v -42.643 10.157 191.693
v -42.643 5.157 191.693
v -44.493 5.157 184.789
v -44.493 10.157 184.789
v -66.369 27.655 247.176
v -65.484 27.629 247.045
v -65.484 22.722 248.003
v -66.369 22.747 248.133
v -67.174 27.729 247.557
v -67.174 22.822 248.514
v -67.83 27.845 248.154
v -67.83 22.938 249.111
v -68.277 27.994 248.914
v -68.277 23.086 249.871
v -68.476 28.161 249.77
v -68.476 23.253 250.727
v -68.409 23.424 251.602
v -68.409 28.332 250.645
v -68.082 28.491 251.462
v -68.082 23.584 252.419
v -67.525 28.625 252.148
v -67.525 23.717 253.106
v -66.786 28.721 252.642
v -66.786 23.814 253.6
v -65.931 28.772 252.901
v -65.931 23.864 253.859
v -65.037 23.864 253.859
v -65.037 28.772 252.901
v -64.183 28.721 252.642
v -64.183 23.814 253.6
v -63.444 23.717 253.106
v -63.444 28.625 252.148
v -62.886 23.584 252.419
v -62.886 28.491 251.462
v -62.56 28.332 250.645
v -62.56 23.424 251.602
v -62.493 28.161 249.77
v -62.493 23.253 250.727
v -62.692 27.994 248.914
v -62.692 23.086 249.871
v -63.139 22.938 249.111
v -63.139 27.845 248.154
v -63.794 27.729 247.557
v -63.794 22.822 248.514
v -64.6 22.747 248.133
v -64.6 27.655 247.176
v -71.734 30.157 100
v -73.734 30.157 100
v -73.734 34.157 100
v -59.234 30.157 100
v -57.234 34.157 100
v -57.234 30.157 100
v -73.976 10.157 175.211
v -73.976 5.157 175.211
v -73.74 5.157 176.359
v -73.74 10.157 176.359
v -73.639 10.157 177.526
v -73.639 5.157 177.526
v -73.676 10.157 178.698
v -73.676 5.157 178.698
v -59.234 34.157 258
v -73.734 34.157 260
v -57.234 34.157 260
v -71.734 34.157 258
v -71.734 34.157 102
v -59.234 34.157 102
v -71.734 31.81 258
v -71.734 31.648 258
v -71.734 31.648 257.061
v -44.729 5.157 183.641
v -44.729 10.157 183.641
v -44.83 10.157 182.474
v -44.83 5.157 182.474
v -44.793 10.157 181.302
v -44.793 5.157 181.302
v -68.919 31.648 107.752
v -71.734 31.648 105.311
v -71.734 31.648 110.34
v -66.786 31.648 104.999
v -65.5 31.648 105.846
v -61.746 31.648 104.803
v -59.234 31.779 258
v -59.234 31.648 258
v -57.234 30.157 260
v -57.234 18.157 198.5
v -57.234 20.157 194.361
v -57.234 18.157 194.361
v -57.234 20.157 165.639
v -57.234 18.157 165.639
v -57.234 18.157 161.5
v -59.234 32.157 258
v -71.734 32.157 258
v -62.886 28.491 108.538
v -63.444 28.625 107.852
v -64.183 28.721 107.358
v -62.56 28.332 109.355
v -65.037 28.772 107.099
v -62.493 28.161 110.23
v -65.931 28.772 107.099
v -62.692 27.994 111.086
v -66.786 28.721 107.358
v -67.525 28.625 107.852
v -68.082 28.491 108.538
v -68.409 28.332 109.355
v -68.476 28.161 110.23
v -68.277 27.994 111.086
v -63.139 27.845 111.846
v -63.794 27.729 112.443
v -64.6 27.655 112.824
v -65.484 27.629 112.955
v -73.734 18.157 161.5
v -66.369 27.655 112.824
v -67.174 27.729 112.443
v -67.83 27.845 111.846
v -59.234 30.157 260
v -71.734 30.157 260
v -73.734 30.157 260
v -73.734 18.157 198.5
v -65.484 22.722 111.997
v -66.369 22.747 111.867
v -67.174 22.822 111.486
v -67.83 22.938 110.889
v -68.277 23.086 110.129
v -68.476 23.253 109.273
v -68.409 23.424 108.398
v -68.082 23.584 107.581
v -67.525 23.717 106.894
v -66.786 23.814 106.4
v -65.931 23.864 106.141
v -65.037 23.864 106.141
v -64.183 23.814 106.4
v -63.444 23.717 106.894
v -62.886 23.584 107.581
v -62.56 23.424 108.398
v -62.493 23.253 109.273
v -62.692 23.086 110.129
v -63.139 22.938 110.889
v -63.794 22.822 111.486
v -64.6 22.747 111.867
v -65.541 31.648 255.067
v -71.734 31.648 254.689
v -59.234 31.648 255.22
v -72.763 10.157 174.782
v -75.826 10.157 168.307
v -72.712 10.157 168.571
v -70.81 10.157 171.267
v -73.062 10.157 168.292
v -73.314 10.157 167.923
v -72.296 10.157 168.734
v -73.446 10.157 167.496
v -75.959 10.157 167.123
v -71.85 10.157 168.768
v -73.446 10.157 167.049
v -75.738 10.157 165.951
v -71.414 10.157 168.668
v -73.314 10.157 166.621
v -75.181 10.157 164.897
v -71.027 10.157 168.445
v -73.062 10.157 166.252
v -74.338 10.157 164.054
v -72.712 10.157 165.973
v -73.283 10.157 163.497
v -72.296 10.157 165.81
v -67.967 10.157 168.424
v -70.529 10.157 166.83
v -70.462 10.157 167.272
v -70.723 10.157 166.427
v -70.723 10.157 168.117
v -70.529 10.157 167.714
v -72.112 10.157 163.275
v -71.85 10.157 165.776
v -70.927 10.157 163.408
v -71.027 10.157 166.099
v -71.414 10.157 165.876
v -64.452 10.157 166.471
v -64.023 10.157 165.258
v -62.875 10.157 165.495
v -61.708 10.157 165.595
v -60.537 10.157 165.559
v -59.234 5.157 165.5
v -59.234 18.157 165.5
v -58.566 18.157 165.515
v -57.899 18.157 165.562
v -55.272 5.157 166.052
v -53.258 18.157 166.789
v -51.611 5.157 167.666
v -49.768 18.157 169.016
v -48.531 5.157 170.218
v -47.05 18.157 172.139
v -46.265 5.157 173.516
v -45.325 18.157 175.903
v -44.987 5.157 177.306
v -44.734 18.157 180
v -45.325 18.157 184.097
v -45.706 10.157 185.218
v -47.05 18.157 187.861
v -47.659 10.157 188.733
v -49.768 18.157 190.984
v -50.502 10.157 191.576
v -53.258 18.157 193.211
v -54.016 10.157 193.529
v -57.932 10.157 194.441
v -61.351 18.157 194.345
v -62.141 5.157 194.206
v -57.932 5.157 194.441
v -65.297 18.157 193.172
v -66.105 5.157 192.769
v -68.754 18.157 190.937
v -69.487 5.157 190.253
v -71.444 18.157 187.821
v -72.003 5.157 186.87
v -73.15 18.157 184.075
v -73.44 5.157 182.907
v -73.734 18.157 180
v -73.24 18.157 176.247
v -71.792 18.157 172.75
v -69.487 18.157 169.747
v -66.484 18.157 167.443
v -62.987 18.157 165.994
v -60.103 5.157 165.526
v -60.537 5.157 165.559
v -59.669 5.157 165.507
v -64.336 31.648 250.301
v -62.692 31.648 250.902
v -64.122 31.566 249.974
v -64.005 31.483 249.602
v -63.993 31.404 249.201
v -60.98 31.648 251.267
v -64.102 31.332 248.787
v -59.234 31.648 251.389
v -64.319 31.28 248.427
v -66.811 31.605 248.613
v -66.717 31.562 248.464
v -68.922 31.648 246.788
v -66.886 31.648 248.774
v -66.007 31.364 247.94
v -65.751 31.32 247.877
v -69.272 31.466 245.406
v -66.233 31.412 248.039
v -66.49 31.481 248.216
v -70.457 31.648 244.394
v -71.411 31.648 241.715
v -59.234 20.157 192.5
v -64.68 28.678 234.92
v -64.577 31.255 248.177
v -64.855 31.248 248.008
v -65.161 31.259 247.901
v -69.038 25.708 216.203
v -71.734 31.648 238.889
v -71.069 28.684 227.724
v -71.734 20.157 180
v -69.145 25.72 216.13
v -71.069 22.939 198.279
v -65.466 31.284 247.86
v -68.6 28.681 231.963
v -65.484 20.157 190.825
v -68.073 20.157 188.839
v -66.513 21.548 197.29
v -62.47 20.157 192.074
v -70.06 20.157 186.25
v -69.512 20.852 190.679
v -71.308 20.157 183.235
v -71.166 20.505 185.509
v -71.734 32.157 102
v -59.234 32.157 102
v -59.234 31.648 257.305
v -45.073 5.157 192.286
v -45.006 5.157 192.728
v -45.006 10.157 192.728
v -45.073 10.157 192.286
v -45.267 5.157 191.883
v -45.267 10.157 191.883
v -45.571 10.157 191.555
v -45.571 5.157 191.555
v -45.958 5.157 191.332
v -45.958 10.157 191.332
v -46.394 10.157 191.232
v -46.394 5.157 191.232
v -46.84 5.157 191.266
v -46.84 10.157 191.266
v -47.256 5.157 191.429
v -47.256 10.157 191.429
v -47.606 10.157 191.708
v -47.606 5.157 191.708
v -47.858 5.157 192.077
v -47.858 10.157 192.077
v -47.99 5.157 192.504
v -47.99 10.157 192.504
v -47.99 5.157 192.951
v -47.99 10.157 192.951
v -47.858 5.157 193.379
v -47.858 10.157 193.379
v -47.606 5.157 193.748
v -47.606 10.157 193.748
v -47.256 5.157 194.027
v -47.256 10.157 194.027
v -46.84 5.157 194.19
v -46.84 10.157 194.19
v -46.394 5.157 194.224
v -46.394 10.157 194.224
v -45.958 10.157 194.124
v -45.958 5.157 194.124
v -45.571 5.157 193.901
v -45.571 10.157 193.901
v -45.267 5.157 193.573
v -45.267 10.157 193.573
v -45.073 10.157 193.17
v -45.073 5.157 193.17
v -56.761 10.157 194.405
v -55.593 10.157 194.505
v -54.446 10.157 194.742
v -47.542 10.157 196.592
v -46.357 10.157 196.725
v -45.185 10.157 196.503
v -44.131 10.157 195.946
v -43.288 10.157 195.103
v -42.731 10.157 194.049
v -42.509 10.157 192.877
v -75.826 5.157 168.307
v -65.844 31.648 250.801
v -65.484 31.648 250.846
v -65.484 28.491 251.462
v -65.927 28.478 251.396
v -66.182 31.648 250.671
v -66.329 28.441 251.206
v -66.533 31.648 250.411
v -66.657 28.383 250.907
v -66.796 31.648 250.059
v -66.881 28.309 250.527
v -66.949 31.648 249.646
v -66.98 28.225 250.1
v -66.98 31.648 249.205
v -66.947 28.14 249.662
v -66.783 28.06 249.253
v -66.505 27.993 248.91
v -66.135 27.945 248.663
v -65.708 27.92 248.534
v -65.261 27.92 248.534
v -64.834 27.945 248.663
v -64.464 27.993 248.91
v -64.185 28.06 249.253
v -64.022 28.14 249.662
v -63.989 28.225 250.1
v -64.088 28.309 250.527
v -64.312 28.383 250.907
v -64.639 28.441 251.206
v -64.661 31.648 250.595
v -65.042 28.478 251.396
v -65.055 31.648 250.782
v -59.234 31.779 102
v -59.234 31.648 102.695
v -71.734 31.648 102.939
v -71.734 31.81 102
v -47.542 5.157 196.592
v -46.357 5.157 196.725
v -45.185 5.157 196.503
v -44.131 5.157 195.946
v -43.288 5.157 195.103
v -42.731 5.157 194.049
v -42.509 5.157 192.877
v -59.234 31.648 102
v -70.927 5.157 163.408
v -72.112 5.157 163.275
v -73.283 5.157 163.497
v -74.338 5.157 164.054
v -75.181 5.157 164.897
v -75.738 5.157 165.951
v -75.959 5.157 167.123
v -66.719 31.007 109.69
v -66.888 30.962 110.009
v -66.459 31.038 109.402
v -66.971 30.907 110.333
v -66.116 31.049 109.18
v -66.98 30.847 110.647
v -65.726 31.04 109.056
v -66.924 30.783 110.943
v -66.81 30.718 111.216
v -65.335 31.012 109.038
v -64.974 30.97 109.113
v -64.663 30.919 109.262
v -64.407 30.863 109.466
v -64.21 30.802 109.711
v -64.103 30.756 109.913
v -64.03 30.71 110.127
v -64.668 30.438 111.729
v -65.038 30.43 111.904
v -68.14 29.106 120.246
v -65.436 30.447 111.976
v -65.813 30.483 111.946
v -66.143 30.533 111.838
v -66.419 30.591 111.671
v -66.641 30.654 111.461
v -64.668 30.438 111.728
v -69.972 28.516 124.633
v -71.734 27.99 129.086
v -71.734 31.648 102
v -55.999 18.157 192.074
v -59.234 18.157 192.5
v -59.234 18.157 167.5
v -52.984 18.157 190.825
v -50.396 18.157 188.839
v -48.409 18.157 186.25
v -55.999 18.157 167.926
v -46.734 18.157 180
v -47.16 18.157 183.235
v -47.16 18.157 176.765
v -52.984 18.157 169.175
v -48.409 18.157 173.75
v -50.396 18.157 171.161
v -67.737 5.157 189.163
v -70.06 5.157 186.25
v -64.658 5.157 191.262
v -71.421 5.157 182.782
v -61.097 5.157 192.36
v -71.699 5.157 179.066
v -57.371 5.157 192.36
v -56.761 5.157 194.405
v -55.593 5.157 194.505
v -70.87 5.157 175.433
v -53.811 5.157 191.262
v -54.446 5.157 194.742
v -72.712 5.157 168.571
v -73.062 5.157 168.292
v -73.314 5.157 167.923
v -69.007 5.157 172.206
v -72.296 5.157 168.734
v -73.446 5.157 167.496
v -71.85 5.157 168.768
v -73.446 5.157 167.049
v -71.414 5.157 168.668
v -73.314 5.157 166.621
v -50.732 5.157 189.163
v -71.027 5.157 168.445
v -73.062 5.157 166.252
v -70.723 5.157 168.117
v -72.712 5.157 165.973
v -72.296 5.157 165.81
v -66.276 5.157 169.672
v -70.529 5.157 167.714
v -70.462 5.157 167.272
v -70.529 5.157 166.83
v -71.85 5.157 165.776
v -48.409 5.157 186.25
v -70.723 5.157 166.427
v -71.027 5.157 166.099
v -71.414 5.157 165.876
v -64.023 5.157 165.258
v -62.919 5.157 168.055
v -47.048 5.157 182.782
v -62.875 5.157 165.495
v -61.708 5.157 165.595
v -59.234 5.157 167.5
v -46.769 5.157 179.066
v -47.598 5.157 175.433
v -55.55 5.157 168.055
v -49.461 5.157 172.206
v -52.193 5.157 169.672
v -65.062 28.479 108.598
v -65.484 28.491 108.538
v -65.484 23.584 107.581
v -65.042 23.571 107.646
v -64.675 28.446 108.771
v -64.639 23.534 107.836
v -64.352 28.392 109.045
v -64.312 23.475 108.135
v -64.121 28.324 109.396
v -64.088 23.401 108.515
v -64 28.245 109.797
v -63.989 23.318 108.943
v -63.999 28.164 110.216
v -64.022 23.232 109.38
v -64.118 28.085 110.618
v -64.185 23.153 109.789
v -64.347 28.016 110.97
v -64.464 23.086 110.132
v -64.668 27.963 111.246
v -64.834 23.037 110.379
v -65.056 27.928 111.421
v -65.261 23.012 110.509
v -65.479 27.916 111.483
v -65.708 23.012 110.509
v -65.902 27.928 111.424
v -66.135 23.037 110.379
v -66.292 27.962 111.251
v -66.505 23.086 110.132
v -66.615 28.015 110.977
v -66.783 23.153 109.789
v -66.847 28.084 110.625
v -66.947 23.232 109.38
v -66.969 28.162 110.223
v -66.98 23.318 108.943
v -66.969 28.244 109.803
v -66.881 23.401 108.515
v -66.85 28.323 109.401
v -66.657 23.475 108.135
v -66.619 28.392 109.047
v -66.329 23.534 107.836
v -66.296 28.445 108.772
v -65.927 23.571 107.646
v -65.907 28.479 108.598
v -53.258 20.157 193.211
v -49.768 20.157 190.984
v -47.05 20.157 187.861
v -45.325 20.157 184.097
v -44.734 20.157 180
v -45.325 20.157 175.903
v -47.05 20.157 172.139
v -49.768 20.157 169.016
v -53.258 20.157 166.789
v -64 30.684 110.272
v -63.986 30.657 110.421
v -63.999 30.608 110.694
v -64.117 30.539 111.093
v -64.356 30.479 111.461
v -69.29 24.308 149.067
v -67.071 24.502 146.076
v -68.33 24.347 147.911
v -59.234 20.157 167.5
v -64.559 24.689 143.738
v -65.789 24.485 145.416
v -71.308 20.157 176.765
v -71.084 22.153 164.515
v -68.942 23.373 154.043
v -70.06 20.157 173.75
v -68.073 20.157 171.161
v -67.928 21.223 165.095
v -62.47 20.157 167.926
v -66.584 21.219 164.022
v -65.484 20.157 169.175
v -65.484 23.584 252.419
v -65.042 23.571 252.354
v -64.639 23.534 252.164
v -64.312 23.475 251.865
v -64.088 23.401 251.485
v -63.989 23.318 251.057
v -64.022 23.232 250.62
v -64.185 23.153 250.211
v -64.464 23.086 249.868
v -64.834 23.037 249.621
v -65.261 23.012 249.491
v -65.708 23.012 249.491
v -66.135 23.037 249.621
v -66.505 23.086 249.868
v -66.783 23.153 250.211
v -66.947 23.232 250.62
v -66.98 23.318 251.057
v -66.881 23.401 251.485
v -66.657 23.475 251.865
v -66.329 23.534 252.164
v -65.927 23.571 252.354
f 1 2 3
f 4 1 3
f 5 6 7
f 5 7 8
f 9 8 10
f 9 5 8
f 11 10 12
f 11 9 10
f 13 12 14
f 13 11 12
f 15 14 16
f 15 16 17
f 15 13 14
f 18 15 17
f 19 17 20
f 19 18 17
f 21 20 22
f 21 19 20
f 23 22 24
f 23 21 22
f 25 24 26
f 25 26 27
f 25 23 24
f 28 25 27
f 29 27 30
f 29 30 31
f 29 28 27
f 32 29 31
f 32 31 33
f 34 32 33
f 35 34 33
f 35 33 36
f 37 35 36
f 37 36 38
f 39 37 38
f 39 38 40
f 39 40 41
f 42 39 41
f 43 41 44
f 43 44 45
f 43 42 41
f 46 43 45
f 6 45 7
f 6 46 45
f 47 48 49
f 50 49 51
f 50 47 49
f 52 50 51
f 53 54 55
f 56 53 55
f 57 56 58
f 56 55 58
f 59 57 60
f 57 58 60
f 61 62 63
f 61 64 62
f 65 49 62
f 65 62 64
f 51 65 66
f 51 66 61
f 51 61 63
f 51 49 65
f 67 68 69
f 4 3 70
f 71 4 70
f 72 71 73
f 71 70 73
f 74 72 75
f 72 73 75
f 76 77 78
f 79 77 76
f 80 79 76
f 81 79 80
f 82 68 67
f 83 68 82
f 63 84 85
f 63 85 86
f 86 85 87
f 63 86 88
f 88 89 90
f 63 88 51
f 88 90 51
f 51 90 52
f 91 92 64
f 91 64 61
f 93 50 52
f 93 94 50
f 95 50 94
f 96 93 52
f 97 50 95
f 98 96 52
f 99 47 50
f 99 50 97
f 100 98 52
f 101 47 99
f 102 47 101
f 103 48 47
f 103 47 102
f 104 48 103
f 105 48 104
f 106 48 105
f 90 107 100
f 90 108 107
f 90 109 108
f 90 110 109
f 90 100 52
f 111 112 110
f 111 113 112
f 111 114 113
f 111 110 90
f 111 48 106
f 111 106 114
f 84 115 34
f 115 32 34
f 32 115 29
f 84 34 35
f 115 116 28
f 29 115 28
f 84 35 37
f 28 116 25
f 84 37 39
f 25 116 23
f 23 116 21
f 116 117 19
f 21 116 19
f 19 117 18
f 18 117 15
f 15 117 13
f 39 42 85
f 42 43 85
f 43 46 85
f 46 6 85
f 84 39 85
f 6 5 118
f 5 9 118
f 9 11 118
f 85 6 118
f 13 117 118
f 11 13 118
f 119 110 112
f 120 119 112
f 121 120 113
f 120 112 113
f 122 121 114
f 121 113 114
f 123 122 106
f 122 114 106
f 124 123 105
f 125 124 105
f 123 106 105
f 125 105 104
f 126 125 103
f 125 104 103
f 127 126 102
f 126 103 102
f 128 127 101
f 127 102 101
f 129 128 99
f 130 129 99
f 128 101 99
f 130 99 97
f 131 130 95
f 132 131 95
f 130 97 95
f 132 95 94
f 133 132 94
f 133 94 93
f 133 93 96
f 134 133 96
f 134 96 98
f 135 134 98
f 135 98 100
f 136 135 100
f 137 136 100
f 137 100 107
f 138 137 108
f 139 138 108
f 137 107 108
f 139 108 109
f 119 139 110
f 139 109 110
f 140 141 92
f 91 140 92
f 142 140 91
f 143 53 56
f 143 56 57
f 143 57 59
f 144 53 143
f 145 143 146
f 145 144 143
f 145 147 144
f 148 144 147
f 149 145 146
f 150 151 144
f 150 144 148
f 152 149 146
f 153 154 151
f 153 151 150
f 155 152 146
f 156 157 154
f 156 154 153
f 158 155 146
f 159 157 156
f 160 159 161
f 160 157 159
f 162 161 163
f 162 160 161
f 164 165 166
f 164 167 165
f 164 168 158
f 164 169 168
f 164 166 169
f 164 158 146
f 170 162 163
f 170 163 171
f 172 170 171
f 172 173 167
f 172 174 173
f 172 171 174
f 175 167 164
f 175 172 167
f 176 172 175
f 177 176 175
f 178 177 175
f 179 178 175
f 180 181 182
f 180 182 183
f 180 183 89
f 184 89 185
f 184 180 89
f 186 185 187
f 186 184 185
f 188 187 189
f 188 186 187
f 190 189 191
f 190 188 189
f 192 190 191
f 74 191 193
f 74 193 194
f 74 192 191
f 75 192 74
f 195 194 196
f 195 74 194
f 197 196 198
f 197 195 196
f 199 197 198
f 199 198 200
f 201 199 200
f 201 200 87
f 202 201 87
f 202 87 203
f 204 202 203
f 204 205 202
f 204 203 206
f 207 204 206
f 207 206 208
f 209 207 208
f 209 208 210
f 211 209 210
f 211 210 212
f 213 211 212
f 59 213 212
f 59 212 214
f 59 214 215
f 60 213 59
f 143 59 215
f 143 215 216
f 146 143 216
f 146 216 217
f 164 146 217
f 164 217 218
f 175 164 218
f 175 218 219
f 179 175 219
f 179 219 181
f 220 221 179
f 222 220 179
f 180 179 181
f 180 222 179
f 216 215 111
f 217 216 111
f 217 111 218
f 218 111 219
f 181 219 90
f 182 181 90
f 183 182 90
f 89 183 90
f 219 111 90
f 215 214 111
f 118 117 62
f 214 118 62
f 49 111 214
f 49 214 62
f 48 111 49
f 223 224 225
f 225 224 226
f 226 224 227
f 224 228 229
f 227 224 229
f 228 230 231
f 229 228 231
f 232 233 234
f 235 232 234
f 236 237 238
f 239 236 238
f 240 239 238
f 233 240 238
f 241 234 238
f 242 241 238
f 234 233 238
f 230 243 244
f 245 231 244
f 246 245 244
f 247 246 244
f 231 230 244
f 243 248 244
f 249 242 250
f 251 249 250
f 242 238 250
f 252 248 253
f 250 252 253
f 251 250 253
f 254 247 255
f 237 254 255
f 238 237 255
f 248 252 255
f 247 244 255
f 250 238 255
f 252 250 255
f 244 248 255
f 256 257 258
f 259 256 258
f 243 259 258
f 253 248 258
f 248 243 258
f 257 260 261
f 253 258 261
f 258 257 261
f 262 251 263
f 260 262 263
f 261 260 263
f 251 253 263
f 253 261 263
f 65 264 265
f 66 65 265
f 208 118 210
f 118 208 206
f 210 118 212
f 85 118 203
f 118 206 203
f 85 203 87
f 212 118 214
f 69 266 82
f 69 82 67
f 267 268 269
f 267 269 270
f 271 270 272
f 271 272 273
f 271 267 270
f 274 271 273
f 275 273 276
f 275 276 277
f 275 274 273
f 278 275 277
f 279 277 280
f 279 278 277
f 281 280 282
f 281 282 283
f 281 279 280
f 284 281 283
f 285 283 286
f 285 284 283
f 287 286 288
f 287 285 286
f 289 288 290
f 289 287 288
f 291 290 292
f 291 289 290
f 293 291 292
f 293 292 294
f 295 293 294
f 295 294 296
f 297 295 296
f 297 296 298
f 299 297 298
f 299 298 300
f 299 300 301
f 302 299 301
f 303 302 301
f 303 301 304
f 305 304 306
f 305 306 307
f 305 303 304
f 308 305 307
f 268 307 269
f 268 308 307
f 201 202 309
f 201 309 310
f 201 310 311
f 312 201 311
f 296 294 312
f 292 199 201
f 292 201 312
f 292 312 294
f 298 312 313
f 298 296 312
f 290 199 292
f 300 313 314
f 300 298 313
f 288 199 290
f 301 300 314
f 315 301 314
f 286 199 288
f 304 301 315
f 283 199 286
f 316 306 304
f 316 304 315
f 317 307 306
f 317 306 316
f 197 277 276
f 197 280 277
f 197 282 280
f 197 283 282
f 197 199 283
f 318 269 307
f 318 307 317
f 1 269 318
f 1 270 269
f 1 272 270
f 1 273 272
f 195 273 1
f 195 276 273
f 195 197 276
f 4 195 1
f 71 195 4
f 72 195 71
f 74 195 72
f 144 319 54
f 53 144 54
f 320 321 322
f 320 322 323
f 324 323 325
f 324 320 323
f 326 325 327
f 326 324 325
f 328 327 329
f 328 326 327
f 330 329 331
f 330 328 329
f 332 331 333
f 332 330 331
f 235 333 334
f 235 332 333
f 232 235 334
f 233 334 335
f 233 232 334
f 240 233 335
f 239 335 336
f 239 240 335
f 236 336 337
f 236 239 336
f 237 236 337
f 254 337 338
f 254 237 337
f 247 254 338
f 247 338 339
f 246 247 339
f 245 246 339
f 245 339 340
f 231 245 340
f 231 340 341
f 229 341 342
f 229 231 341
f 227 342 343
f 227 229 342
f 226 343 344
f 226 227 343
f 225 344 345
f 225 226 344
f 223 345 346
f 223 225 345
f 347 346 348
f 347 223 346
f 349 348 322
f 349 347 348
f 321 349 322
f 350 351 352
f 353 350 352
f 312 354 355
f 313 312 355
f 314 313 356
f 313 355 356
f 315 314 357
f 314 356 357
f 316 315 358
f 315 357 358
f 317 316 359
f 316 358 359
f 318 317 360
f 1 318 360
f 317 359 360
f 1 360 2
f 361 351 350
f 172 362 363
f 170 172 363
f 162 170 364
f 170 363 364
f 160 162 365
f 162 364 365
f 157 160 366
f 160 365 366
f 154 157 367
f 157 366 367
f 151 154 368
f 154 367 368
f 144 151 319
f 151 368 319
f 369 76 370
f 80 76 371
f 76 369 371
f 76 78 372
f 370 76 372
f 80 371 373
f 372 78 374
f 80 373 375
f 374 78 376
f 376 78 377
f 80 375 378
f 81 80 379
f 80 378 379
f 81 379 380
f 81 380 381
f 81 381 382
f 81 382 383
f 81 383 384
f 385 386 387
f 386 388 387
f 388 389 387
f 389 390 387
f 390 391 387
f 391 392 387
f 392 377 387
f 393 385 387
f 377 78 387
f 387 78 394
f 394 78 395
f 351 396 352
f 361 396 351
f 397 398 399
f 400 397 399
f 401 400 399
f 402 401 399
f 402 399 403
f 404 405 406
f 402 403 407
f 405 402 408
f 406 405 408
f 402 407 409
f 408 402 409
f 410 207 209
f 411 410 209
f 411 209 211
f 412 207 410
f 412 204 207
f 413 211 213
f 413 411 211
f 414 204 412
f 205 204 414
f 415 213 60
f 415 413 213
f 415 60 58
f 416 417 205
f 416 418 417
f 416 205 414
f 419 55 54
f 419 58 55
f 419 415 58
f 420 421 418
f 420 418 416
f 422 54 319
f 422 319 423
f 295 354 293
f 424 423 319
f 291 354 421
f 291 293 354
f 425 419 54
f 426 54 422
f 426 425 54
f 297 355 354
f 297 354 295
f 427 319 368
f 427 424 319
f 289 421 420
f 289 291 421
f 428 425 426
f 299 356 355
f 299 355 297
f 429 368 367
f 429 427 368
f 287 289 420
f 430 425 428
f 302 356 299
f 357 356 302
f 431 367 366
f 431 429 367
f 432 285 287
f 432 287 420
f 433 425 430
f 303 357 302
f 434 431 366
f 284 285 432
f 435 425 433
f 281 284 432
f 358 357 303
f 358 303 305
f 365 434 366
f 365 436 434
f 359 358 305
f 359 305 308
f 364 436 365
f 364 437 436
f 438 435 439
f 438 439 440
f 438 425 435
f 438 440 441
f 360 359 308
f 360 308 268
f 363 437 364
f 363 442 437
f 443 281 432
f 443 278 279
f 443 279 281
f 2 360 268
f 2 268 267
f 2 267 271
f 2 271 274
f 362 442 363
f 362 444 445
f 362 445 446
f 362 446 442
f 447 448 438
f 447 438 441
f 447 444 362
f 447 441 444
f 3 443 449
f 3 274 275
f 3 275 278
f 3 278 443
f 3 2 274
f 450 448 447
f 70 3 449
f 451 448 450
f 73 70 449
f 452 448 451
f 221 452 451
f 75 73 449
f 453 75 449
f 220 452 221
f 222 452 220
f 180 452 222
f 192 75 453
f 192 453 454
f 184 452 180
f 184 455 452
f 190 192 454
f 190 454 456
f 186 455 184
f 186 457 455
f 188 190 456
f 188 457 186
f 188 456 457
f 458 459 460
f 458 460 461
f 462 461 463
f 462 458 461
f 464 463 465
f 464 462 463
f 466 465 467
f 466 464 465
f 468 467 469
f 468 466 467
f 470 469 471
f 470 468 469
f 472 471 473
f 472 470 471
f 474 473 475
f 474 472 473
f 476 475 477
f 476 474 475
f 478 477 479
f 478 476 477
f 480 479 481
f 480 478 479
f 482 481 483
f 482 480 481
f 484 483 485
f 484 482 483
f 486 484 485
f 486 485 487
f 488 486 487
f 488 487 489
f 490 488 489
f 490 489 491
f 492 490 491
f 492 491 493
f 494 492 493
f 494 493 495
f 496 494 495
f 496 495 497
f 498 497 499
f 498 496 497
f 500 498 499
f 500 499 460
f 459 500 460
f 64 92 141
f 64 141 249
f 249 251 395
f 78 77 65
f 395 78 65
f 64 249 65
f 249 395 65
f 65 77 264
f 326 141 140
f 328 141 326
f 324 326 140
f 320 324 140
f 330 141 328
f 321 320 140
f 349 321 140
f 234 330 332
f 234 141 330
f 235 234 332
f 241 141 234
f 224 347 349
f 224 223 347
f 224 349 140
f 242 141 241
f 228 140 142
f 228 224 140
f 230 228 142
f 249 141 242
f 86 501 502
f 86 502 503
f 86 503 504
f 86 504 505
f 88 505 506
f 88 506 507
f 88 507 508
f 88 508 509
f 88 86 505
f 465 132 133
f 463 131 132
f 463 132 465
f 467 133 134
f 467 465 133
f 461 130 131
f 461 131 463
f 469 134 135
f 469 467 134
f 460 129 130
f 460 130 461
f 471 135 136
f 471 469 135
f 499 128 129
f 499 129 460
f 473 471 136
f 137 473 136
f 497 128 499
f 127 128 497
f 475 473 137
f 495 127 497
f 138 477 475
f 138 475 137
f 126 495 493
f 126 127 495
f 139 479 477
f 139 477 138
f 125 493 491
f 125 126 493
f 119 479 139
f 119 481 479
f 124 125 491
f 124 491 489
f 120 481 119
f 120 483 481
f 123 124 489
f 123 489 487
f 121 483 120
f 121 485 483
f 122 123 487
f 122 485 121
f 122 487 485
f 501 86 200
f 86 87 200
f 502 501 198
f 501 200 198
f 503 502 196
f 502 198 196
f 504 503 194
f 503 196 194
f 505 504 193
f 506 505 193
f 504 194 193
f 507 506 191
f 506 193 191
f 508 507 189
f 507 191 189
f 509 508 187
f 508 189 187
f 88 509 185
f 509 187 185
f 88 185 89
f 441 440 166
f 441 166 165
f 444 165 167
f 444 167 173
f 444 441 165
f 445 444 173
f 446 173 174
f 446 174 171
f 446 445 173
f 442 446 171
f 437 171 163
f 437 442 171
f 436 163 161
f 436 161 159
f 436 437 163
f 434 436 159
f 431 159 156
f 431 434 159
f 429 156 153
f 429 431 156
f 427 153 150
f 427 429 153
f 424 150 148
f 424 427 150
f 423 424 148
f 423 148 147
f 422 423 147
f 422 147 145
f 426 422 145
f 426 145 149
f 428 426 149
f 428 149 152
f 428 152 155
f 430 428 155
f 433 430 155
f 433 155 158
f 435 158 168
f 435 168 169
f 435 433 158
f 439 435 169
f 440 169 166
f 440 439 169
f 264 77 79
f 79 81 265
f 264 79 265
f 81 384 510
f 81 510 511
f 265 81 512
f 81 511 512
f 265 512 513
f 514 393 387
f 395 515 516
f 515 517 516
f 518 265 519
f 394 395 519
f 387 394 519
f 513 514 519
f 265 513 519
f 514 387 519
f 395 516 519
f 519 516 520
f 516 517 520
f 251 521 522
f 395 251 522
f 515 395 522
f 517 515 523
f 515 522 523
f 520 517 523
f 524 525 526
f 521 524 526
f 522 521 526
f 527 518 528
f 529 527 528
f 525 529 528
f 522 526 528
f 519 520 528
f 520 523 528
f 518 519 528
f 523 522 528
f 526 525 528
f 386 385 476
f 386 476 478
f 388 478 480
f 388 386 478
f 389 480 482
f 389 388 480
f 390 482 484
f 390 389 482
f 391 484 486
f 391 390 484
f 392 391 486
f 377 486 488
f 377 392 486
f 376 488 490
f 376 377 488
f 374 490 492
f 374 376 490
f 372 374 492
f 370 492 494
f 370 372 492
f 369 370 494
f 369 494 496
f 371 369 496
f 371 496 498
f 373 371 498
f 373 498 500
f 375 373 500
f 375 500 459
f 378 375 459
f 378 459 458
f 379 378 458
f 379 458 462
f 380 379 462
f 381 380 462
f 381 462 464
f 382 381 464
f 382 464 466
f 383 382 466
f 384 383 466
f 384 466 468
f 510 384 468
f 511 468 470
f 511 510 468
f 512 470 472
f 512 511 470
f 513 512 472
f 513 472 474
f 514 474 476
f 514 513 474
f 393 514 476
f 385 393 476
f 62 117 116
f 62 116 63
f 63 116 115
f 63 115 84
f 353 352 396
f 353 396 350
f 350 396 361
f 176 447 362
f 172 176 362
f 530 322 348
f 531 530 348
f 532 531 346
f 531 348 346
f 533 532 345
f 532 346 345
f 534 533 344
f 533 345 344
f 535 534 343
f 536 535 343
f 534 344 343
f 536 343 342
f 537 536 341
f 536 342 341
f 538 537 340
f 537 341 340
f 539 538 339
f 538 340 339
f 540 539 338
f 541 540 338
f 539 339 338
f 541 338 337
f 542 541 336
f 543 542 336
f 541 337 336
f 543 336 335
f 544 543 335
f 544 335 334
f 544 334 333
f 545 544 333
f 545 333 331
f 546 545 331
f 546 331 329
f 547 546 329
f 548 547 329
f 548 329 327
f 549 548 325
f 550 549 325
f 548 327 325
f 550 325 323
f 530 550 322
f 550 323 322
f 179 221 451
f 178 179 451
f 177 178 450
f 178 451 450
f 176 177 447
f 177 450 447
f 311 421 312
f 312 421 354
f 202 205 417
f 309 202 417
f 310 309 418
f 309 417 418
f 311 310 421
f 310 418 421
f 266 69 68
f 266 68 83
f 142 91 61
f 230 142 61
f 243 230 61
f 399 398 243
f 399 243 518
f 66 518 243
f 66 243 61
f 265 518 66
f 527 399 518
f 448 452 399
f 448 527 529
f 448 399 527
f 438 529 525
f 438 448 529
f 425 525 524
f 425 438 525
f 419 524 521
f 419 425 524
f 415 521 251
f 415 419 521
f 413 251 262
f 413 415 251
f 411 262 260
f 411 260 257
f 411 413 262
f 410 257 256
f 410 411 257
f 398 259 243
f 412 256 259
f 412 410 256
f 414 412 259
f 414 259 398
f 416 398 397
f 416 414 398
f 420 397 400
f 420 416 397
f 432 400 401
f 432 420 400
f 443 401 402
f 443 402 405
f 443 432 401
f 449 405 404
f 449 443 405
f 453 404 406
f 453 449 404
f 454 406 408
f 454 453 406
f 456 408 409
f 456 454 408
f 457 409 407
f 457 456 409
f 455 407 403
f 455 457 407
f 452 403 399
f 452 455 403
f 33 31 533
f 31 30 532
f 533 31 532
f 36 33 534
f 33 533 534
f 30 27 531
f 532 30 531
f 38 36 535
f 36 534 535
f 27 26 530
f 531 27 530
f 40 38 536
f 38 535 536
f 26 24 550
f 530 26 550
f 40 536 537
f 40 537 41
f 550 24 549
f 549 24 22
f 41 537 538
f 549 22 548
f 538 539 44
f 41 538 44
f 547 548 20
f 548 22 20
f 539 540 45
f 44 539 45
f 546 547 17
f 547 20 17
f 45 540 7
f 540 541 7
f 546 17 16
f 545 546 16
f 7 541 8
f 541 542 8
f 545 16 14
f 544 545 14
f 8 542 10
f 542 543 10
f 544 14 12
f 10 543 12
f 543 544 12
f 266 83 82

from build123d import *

# Parameters (mm, degrees)
EXTRUDE_START         = -5
EXTRUDE_1_OUTLINE_R   = 1.5
EXTRUDE_1_DEPTH       = 5
EXTRUDE_1_2_OUTLINE_R = 1.5
EXTRUDE_1_2_DEPTH     = 5
SKETCH_2_R            = 14.5
SKETCH_2_R_2          = 12.5
EXTRUDE_2_DEPTH       = 13
SKETCH_3_R            = 14.5
SKETCH_3_R_2          = 12.5
EXTRUDE_5_DEPTH       = 2
SKETCH_4_W            = 16.5
SKETCH_4_H            = 160
SKETCH_4_W_2          = 12.5
SKETCH_4_H_2          = 156
EXTRUDE_4_DEPTH       = 12
CUT_EXTRUDE_1_REACH   = 265.836
EXTRUDE_6_DEPTH       = 60
EXTRUDE_7_DEPTH       = 60
SKETCH_12_W           = 16.582102221
SKETCH_12_H           = 6.424530869
SKETCH_12_W_2         = 10.745747925
SKETCH_12_H_2         = 9.027697981
CUT_EXTRUDE_2_DEPTH   = 60
SKETCH_14_W           = 16.5
SKETCH_14_H           = 160
SKETCH_14_W_2         = 12.5
SKETCH_14_H_2         = 156
EXTRUDE_8_DEPTH       = 2
SKETCH_16_R           = 3
SKETCH_16_R_2         = 1.5
EXTRUDE_9_DEPTH       = 5
CUT_EXTRUDE_START     = -5
SKETCH_17_R           = 1.5
CUT_EXTRUDE_3_DEPTH   = 5
SKETCH_18_R           = 1.5
CUT_EXTRUDE_4_DEPTH   = 5


with BuildPart() as part:
    # 填料-伸長1: read off the stored shape, not the designer's step
    # 填料-伸長1 outline → 填料-伸長1 (new body)
    with BuildSketch(Plane(origin=(0, 10.156954032, 0), x_dir=(1, 0, 0), z_dir=(0, 1, 0)).offset(EXTRUDE_START)):
        with BuildLine():
            Line((-54.445663034, -194.741719927), (-47.541721945, -196.591625367))
            ThreePointArc((-47.541721945, -196.591625367), (-43.67801864, -195.556349186), (-42.64274246, -191.692645881))
            Line((-42.64274246, -191.692645881), (-44.492647899, -184.788704792))
            ThreePointArc((-44.492647899, -184.788704792), (-44.796491977, -183.058763578), (-44.792972571, -181.302345222))
            ThreePointArc((-44.792972571, -181.302345222), (-48.981319499, -190.253048327), (-57.932022604, -194.441395255))
            ThreePointArc((-57.932022604, -194.441395255), (-56.175604248, -194.43787585), (-54.445663034, -194.741719927))
        make_face()
        with Locations((-46.506445765, -192.727922061)):
            Circle(EXTRUDE_1_OUTLINE_R, mode=Mode.SUBTRACT)
    extrude(amount=EXTRUDE_1_DEPTH)



with BuildPart() as body_2:
    # Extrude 1 2 outline → Extrude 1 2 (new body)
    with BuildSketch(Plane(origin=(0, 10.156954032, 0), x_dir=(1, 0, 0), z_dir=(0, 1, 0)).offset(EXTRUDE_START)):
        with BuildLine():
            Line((-64.023072619, -165.258280073), (-70.927013707, -163.408374633))
            ThreePointArc((-70.927013707, -163.408374633), (-74.790717013, -164.443650813), (-75.825993193, -168.307354119))
            Line((-75.825993193, -168.307354119), (-73.976087754, -175.211295208))
            ThreePointArc((-73.976087754, -175.211295208), (-73.672243676, -176.941236422), (-73.675763082, -178.697654778))
            ThreePointArc((-73.675763082, -178.697654778), (-69.487416154, -169.746951673), (-60.536713049, -165.558604745))
            ThreePointArc((-60.536713049, -165.558604745), (-62.293131405, -165.56212415), (-64.023072619, -165.258280073))
        make_face()
        with Locations((-71.962289888, -167.272077939)):
            Circle(EXTRUDE_1_2_OUTLINE_R, mode=Mode.SUBTRACT)
    extrude(amount=EXTRUDE_1_2_DEPTH)


with BuildPart() as part_1:
    add(part.part)

    add(body_2.part)  # 填料-伸長2 merges body 2
    # 草圖2 → 填料-伸長2 (add)
    with BuildSketch(Plane.XZ.offset(-5.156954032)):
        with Locations(Location((-59.234367826, 180, 0), (0, 0, 270))):
            Circle(SKETCH_2_R)
        with Locations(Location((-59.234367826, 180, 0), (0, 0, 270))):
            Circle(SKETCH_2_R_2, mode=Mode.SUBTRACT)
    extrude(amount=-EXTRUDE_2_DEPTH)

    # 草圖3 → 填料-伸長5 (add)
    # profile 1 of 4: a face of its own
    with BuildSketch(Plane(origin=(0, 18.156954032, 0), x_dir=(1, 0, 0), z_dir=(0, 1, 0))):
        with Locations(Location((-59.234367826, -180, 0), (0, 0, 95.153074257))):
            Circle(SKETCH_3_R)
        with Locations(Location((-59.234367826, -180, 0), (0, 0, 90))):
            Circle(SKETCH_3_R_2, mode=Mode.SUBTRACT)
    # profile 2 of 4: a face of its own
    with BuildSketch(Plane(origin=(0, 18.156954032, 0), x_dir=(1, 0, 0), z_dir=(0, 1, 0))):
        with BuildLine():
            Line((-73.734367826, -180), (-73.734367826, -260))
            Line((-73.734367826, -260), (-57.234367826, -260))
            Line((-57.234367826, -260), (-57.234367826, -194.361406616))
            ThreePointArc((-57.234367826, -194.361406616), (-68.754084209, -190.937321427), (-73.734367826, -180))
        make_face()
    # profile 3 of 4: a face of its own
    with BuildSketch(Plane(origin=(0, 18.156954032, 0), x_dir=(1, 0, 0), z_dir=(0, 1, 0))):
        with BuildLine():
            Line((-73.734367826, -100), (-73.734367826, -180))
            ThreePointArc((-73.734367826, -180), (-68.754084209, -169.062678573), (-57.234367826, -165.638593384))
            Line((-57.234367826, -165.638593384), (-57.234367826, -100))
            Line((-57.234367826, -100), (-73.734367826, -100))
        make_face()
    # profile 4 of 4: a face of its own
    with BuildSketch(Plane(origin=(0, 18.156954032, 0), x_dir=(1, 0, 0), z_dir=(0, 1, 0))):
        with BuildLine():
            Line((-59.234367826, -167.5), (-59.234367826, -192.5))
            ThreePointArc((-59.234367826, -192.5), (-50.395533062, -188.838834765), (-46.734367826, -180))
            ThreePointArc((-46.734367826, -180), (-50.395533062, -171.161165235), (-59.234367826, -167.5))
        make_face()
    extrude(amount=EXTRUDE_5_DEPTH)

    # 草圖4 → 填料-伸長4 (add)
    with BuildSketch(Plane(origin=(0, 20.156954032, 0), x_dir=(1, 0, 0), z_dir=(0, 1, 0))):
        with Locations((-65.484367826, -180)):
            Rectangle(SKETCH_4_W, SKETCH_4_H)
        with Locations((-65.484367826, -180)):
            Rectangle(SKETCH_4_W_2, SKETCH_4_H_2, mode=Mode.SUBTRACT)
    extrude(amount=EXTRUDE_4_DEPTH)

    # 除料-伸長1: up to this face of the body (flat: up to its plane)
    cut_extrude_1_end = Plane(part_1.part.faces().sort_by_distance((-57.234367826, 26.156954032, 180))[0])
    # 草圖7 → 除料-伸長1 (cut, up to the picked face)
    with BuildSketch(Plane.ZY.offset(73.734367826), mode=Mode.PRIVATE) as cut_extrude_1_sk1:
        Polygon((260, 30.156954032), (198.5, 18.156954032), (264.047822103, 13.706220506), (266.363809243, 29.164088167), align=None)
    cut_extrude_1_tool1 = split(extrude(cut_extrude_1_sk1.sketch, amount=-CUT_EXTRUDE_1_REACH, mode=Mode.PRIVATE), bisect_by=cut_extrude_1_end, keep=Keep.BOTH, mode=Mode.PRIVATE)
    # 草圖7 → 除料-伸長1 (cut, up to the picked face)
    with BuildSketch(Plane.ZY.offset(73.734367826), mode=Mode.PRIVATE) as cut_extrude_1_sk2:
        Polygon((95.952177897, 13.706220506), (93.636190757, 29.164088167), (100, 30.156954032), (161.5, 18.156954032), align=None)
    cut_extrude_1_tool2 = split(extrude(cut_extrude_1_sk2.sketch, amount=-CUT_EXTRUDE_1_REACH, mode=Mode.PRIVATE), bisect_by=cut_extrude_1_end, keep=Keep.BOTH, mode=Mode.PRIVATE)
    add(cut_extrude_1_tool1.solids().sort_by(Axis((-73.734368, 20.991529, 242.810826), (1, 0, 0)))[0], mode=Mode.SUBTRACT)
    add(cut_extrude_1_tool2.solids().sort_by(Axis((-73.734368, 20.991529, 117.189174), (1, 0, 0)))[0], mode=Mode.SUBTRACT)



with BuildPart() as body_2_2:
    # 草圖5 → 疊層拉伸1 section 0
    with BuildSketch(Plane(origin=(0, 32.156954032, 0), x_dir=(1, 0, 0), z_dir=(0, 1, 0))):
        with BuildLine():
            Line((-71.734367826, -258), (-59.234367826, -258))
            Line((-59.234367826, -258), (-59.234367826, -260))
            Line((-59.234367826, -260), (-71.734367826, -260))
            Line((-71.734367826, -260), (-71.734367826, -258))
        make_face()
    # 草圖6 for 疊層拉伸1 → 疊層拉伸1 section 1
    with BuildSketch(Plane(origin=(0, 20.156954032, 0), x_dir=(1, 0, 0), z_dir=(0, 1, 0))):
        with BuildLine():
            Line((-71.734367826, -180), (-71.734367826, -190.770329614))
            # circular arc as an exact rational Bezier (weights 1, cos(half-angle), 1)
            Bezier((-71.734367826, -190.770329614), (-66.797532736, -196.5), (-59.234367826, -196.5), weights=[1, 0.909050947, 1])
            Line((-59.234367826, -196.5), (-59.234367826, -192.5))
            Bezier((-59.234367826, -192.5), (-71.734367826, -192.5), (-71.734367826, -180), weights=[1, 0.707106781, 1])
        make_face()
    loft()


with BuildPart() as part_2:
    add(part_1.part)

    add(body_2_2.part)  # 填料-伸長6 merges body 2 2
    # 草圖8 → 填料-伸長6 (add, along a direction that is not the sketch's normal)
    with BuildSketch(Plane(origin=(0, 20.156954032, 0), x_dir=(1, 0, 0), z_dir=(0, 1, 0))):
        with BuildLine():
            Line((-71.734367826, -208.75), (-59.234367826, -208.75))
            Line((-59.234367826, -208.75), (-59.234367826, -192.5))
            ThreePointArc((-59.234367826, -192.5), (-68.073202591, -188.838834765), (-71.734367826, -180))
            Line((-71.734367826, -180), (-71.734367826, -208.75))
        make_face()
    extrude(amount=EXTRUDE_6_DEPTH, dir=(-6.810459085749413e-15, 0.1915103594196487, 0.9814905920256991))

    # 草圖10 → 疊層拉伸2 section 0
    with BuildSketch(Plane(origin=(0, 32.156954032, 0), x_dir=(1, 0, 0), z_dir=(0, 1, 0))):
        with BuildLine():
            Line((-71.734367826, -102), (-59.234367826, -102))
            Line((-59.234367826, -102), (-59.234367826, -100))
            Line((-59.234367826, -100), (-71.734367826, -100))
            Line((-71.734367826, -100), (-71.734367826, -102))
        make_face()
    # 草圖9 for 疊層拉伸2 → 疊層拉伸2 section 1
    with BuildSketch(Plane(origin=(0, 20.156954032, 0), x_dir=(1, 0, 0), z_dir=(0, 1, 0))):
        with BuildLine():
            Line((-71.734367826, -180), (-71.734367826, -169.229670386))
            Bezier((-71.734367826, -169.229670386), (-66.797532736, -163.5), (-59.234367826, -163.5), weights=[1, 0.909050947, 1])
            Line((-59.234367826, -163.5), (-59.234367826, -167.5))
            Bezier((-59.234367826, -167.5), (-71.734367826, -167.5), (-71.734367826, -180), weights=[1, 0.707106781, 1])
        make_face()
    loft()

    # 草圖11 → 填料-伸長7 (add, along a direction that is not the sketch's normal)
    with BuildSketch(Plane(origin=(0, 20.156954032, 0), x_dir=(1, 0, 0), z_dir=(0, 1, 0))):
        with BuildLine():
            Line((-71.734367826, -151.25), (-71.734367826, -169.229670386))
            add(Edge.make_bspline(
                [(-71.734367826, -169.229670386), (-70.98639539, -168.36157667), (-70.129603224, -167.552057992), (-68.236734624, -166.121426347), (-67.200962736, -165.500879161), (-65.018377367, -164.50043958), (-63.872168611, -164.120824376), (-61.552791986, -163.620673884), (-60.380251531, -163.5), (-59.234367826, -163.5)],
                knots=[0, 0, 0, 0, 0.25, 0.25, 0.5, 0.5, 0.75, 0.75, 1, 1, 1, 1], degree=3))
            Line((-59.234367826, -163.5), (-59.234367826, -151.25))
            Line((-59.234367826, -151.25), (-71.734367826, -151.25))
        make_face()
    extrude(amount=EXTRUDE_7_DEPTH, dir=(0, 0.1915103594196487, -0.9814905920256991))

    # 草圖12 → 除料-伸長2 (cut)
    with BuildSketch(Plane(origin=(-57.234367826, 0, 0), x_dir=(0, 0, -1), z_dir=(1, 0, 0))):
        with Locations((-91.708948889, 28.944688598)):
            Rectangle(SKETCH_12_W, SKETCH_12_H)
        with Locations((-265.372873962, 27.643105042)):
            Rectangle(SKETCH_12_W_2, SKETCH_12_H_2)
    extrude(amount=-CUT_EXTRUDE_2_DEPTH, mode=Mode.SUBTRACT)

    # 草圖14 → 填料-伸長8 (add)
    with BuildSketch(Plane(origin=(0, 32.156954032, 0), x_dir=(1, 0, 0), z_dir=(0, 1, 0))):
        with Locations((-65.484367826, -180)):
            Rectangle(SKETCH_14_W, SKETCH_14_H)
        with Locations((-65.484367826, -180)):
            Rectangle(SKETCH_14_W_2, SKETCH_14_H_2, mode=Mode.SUBTRACT)
    extrude(amount=EXTRUDE_8_DEPTH)

    # 草圖16 → 填料-伸長9 (add)
    with BuildSketch(Plane(origin=(0, 47.847472623, 9.336092219), x_dir=(1, 0, 0), z_dir=(0, -0.981490592025699, -0.19151035941964872))):
        with Locations(Location((-65.484367826, 102.572898444, 0), (0, 0, 90))):
            Circle(SKETCH_16_R)
        with Locations(Location((-65.484367826, 102.572898444, 0), (0, 0, 270))):
            Circle(SKETCH_16_R_2, mode=Mode.SUBTRACT)
    extrude_9 = extrude(amount=EXTRUDE_9_DEPTH)

    # 草圖17 → 除料-伸長3 (cut)
    with BuildSketch(Plane(origin=(0, 47.847472623, 9.336092219), x_dir=(1, 0, 0), z_dir=(0, -0.981490592025699, -0.19151035941964872)).offset(CUT_EXTRUDE_START)):
        with Locations(Location((-65.484367826, 102.572898444, 0), (0, 0, 57.025282915))):
            Circle(SKETCH_17_R)
    extrude(amount=CUT_EXTRUDE_3_DEPTH, mode=Mode.SUBTRACT)

    # 鏡射1: 填料-伸長9 across plane
    add(extrude_9.mirror(Plane(origin=(0, 0, 180), x_dir=(1, 0, 0), z_dir=(0, 0, -1))))

    # 草圖18 → 除料-伸長4 (cut)
    with BuildSketch(Plane(origin=(0, -19.820149153, 3.867346176), x_dir=(1, 0, 0), z_dir=(-4.422479578024356e-14, -0.981490592025698, 0.1915103594196541)).offset(CUT_EXTRUDE_START)):
        with Locations(Location((-65.484367826, 250.763714686, 0), (0, 0, 90))):
            Circle(SKETCH_18_R)
    extrude(amount=CUT_EXTRUDE_4_DEPTH, mode=Mode.SUBTRACT)


solid = part_2.part
